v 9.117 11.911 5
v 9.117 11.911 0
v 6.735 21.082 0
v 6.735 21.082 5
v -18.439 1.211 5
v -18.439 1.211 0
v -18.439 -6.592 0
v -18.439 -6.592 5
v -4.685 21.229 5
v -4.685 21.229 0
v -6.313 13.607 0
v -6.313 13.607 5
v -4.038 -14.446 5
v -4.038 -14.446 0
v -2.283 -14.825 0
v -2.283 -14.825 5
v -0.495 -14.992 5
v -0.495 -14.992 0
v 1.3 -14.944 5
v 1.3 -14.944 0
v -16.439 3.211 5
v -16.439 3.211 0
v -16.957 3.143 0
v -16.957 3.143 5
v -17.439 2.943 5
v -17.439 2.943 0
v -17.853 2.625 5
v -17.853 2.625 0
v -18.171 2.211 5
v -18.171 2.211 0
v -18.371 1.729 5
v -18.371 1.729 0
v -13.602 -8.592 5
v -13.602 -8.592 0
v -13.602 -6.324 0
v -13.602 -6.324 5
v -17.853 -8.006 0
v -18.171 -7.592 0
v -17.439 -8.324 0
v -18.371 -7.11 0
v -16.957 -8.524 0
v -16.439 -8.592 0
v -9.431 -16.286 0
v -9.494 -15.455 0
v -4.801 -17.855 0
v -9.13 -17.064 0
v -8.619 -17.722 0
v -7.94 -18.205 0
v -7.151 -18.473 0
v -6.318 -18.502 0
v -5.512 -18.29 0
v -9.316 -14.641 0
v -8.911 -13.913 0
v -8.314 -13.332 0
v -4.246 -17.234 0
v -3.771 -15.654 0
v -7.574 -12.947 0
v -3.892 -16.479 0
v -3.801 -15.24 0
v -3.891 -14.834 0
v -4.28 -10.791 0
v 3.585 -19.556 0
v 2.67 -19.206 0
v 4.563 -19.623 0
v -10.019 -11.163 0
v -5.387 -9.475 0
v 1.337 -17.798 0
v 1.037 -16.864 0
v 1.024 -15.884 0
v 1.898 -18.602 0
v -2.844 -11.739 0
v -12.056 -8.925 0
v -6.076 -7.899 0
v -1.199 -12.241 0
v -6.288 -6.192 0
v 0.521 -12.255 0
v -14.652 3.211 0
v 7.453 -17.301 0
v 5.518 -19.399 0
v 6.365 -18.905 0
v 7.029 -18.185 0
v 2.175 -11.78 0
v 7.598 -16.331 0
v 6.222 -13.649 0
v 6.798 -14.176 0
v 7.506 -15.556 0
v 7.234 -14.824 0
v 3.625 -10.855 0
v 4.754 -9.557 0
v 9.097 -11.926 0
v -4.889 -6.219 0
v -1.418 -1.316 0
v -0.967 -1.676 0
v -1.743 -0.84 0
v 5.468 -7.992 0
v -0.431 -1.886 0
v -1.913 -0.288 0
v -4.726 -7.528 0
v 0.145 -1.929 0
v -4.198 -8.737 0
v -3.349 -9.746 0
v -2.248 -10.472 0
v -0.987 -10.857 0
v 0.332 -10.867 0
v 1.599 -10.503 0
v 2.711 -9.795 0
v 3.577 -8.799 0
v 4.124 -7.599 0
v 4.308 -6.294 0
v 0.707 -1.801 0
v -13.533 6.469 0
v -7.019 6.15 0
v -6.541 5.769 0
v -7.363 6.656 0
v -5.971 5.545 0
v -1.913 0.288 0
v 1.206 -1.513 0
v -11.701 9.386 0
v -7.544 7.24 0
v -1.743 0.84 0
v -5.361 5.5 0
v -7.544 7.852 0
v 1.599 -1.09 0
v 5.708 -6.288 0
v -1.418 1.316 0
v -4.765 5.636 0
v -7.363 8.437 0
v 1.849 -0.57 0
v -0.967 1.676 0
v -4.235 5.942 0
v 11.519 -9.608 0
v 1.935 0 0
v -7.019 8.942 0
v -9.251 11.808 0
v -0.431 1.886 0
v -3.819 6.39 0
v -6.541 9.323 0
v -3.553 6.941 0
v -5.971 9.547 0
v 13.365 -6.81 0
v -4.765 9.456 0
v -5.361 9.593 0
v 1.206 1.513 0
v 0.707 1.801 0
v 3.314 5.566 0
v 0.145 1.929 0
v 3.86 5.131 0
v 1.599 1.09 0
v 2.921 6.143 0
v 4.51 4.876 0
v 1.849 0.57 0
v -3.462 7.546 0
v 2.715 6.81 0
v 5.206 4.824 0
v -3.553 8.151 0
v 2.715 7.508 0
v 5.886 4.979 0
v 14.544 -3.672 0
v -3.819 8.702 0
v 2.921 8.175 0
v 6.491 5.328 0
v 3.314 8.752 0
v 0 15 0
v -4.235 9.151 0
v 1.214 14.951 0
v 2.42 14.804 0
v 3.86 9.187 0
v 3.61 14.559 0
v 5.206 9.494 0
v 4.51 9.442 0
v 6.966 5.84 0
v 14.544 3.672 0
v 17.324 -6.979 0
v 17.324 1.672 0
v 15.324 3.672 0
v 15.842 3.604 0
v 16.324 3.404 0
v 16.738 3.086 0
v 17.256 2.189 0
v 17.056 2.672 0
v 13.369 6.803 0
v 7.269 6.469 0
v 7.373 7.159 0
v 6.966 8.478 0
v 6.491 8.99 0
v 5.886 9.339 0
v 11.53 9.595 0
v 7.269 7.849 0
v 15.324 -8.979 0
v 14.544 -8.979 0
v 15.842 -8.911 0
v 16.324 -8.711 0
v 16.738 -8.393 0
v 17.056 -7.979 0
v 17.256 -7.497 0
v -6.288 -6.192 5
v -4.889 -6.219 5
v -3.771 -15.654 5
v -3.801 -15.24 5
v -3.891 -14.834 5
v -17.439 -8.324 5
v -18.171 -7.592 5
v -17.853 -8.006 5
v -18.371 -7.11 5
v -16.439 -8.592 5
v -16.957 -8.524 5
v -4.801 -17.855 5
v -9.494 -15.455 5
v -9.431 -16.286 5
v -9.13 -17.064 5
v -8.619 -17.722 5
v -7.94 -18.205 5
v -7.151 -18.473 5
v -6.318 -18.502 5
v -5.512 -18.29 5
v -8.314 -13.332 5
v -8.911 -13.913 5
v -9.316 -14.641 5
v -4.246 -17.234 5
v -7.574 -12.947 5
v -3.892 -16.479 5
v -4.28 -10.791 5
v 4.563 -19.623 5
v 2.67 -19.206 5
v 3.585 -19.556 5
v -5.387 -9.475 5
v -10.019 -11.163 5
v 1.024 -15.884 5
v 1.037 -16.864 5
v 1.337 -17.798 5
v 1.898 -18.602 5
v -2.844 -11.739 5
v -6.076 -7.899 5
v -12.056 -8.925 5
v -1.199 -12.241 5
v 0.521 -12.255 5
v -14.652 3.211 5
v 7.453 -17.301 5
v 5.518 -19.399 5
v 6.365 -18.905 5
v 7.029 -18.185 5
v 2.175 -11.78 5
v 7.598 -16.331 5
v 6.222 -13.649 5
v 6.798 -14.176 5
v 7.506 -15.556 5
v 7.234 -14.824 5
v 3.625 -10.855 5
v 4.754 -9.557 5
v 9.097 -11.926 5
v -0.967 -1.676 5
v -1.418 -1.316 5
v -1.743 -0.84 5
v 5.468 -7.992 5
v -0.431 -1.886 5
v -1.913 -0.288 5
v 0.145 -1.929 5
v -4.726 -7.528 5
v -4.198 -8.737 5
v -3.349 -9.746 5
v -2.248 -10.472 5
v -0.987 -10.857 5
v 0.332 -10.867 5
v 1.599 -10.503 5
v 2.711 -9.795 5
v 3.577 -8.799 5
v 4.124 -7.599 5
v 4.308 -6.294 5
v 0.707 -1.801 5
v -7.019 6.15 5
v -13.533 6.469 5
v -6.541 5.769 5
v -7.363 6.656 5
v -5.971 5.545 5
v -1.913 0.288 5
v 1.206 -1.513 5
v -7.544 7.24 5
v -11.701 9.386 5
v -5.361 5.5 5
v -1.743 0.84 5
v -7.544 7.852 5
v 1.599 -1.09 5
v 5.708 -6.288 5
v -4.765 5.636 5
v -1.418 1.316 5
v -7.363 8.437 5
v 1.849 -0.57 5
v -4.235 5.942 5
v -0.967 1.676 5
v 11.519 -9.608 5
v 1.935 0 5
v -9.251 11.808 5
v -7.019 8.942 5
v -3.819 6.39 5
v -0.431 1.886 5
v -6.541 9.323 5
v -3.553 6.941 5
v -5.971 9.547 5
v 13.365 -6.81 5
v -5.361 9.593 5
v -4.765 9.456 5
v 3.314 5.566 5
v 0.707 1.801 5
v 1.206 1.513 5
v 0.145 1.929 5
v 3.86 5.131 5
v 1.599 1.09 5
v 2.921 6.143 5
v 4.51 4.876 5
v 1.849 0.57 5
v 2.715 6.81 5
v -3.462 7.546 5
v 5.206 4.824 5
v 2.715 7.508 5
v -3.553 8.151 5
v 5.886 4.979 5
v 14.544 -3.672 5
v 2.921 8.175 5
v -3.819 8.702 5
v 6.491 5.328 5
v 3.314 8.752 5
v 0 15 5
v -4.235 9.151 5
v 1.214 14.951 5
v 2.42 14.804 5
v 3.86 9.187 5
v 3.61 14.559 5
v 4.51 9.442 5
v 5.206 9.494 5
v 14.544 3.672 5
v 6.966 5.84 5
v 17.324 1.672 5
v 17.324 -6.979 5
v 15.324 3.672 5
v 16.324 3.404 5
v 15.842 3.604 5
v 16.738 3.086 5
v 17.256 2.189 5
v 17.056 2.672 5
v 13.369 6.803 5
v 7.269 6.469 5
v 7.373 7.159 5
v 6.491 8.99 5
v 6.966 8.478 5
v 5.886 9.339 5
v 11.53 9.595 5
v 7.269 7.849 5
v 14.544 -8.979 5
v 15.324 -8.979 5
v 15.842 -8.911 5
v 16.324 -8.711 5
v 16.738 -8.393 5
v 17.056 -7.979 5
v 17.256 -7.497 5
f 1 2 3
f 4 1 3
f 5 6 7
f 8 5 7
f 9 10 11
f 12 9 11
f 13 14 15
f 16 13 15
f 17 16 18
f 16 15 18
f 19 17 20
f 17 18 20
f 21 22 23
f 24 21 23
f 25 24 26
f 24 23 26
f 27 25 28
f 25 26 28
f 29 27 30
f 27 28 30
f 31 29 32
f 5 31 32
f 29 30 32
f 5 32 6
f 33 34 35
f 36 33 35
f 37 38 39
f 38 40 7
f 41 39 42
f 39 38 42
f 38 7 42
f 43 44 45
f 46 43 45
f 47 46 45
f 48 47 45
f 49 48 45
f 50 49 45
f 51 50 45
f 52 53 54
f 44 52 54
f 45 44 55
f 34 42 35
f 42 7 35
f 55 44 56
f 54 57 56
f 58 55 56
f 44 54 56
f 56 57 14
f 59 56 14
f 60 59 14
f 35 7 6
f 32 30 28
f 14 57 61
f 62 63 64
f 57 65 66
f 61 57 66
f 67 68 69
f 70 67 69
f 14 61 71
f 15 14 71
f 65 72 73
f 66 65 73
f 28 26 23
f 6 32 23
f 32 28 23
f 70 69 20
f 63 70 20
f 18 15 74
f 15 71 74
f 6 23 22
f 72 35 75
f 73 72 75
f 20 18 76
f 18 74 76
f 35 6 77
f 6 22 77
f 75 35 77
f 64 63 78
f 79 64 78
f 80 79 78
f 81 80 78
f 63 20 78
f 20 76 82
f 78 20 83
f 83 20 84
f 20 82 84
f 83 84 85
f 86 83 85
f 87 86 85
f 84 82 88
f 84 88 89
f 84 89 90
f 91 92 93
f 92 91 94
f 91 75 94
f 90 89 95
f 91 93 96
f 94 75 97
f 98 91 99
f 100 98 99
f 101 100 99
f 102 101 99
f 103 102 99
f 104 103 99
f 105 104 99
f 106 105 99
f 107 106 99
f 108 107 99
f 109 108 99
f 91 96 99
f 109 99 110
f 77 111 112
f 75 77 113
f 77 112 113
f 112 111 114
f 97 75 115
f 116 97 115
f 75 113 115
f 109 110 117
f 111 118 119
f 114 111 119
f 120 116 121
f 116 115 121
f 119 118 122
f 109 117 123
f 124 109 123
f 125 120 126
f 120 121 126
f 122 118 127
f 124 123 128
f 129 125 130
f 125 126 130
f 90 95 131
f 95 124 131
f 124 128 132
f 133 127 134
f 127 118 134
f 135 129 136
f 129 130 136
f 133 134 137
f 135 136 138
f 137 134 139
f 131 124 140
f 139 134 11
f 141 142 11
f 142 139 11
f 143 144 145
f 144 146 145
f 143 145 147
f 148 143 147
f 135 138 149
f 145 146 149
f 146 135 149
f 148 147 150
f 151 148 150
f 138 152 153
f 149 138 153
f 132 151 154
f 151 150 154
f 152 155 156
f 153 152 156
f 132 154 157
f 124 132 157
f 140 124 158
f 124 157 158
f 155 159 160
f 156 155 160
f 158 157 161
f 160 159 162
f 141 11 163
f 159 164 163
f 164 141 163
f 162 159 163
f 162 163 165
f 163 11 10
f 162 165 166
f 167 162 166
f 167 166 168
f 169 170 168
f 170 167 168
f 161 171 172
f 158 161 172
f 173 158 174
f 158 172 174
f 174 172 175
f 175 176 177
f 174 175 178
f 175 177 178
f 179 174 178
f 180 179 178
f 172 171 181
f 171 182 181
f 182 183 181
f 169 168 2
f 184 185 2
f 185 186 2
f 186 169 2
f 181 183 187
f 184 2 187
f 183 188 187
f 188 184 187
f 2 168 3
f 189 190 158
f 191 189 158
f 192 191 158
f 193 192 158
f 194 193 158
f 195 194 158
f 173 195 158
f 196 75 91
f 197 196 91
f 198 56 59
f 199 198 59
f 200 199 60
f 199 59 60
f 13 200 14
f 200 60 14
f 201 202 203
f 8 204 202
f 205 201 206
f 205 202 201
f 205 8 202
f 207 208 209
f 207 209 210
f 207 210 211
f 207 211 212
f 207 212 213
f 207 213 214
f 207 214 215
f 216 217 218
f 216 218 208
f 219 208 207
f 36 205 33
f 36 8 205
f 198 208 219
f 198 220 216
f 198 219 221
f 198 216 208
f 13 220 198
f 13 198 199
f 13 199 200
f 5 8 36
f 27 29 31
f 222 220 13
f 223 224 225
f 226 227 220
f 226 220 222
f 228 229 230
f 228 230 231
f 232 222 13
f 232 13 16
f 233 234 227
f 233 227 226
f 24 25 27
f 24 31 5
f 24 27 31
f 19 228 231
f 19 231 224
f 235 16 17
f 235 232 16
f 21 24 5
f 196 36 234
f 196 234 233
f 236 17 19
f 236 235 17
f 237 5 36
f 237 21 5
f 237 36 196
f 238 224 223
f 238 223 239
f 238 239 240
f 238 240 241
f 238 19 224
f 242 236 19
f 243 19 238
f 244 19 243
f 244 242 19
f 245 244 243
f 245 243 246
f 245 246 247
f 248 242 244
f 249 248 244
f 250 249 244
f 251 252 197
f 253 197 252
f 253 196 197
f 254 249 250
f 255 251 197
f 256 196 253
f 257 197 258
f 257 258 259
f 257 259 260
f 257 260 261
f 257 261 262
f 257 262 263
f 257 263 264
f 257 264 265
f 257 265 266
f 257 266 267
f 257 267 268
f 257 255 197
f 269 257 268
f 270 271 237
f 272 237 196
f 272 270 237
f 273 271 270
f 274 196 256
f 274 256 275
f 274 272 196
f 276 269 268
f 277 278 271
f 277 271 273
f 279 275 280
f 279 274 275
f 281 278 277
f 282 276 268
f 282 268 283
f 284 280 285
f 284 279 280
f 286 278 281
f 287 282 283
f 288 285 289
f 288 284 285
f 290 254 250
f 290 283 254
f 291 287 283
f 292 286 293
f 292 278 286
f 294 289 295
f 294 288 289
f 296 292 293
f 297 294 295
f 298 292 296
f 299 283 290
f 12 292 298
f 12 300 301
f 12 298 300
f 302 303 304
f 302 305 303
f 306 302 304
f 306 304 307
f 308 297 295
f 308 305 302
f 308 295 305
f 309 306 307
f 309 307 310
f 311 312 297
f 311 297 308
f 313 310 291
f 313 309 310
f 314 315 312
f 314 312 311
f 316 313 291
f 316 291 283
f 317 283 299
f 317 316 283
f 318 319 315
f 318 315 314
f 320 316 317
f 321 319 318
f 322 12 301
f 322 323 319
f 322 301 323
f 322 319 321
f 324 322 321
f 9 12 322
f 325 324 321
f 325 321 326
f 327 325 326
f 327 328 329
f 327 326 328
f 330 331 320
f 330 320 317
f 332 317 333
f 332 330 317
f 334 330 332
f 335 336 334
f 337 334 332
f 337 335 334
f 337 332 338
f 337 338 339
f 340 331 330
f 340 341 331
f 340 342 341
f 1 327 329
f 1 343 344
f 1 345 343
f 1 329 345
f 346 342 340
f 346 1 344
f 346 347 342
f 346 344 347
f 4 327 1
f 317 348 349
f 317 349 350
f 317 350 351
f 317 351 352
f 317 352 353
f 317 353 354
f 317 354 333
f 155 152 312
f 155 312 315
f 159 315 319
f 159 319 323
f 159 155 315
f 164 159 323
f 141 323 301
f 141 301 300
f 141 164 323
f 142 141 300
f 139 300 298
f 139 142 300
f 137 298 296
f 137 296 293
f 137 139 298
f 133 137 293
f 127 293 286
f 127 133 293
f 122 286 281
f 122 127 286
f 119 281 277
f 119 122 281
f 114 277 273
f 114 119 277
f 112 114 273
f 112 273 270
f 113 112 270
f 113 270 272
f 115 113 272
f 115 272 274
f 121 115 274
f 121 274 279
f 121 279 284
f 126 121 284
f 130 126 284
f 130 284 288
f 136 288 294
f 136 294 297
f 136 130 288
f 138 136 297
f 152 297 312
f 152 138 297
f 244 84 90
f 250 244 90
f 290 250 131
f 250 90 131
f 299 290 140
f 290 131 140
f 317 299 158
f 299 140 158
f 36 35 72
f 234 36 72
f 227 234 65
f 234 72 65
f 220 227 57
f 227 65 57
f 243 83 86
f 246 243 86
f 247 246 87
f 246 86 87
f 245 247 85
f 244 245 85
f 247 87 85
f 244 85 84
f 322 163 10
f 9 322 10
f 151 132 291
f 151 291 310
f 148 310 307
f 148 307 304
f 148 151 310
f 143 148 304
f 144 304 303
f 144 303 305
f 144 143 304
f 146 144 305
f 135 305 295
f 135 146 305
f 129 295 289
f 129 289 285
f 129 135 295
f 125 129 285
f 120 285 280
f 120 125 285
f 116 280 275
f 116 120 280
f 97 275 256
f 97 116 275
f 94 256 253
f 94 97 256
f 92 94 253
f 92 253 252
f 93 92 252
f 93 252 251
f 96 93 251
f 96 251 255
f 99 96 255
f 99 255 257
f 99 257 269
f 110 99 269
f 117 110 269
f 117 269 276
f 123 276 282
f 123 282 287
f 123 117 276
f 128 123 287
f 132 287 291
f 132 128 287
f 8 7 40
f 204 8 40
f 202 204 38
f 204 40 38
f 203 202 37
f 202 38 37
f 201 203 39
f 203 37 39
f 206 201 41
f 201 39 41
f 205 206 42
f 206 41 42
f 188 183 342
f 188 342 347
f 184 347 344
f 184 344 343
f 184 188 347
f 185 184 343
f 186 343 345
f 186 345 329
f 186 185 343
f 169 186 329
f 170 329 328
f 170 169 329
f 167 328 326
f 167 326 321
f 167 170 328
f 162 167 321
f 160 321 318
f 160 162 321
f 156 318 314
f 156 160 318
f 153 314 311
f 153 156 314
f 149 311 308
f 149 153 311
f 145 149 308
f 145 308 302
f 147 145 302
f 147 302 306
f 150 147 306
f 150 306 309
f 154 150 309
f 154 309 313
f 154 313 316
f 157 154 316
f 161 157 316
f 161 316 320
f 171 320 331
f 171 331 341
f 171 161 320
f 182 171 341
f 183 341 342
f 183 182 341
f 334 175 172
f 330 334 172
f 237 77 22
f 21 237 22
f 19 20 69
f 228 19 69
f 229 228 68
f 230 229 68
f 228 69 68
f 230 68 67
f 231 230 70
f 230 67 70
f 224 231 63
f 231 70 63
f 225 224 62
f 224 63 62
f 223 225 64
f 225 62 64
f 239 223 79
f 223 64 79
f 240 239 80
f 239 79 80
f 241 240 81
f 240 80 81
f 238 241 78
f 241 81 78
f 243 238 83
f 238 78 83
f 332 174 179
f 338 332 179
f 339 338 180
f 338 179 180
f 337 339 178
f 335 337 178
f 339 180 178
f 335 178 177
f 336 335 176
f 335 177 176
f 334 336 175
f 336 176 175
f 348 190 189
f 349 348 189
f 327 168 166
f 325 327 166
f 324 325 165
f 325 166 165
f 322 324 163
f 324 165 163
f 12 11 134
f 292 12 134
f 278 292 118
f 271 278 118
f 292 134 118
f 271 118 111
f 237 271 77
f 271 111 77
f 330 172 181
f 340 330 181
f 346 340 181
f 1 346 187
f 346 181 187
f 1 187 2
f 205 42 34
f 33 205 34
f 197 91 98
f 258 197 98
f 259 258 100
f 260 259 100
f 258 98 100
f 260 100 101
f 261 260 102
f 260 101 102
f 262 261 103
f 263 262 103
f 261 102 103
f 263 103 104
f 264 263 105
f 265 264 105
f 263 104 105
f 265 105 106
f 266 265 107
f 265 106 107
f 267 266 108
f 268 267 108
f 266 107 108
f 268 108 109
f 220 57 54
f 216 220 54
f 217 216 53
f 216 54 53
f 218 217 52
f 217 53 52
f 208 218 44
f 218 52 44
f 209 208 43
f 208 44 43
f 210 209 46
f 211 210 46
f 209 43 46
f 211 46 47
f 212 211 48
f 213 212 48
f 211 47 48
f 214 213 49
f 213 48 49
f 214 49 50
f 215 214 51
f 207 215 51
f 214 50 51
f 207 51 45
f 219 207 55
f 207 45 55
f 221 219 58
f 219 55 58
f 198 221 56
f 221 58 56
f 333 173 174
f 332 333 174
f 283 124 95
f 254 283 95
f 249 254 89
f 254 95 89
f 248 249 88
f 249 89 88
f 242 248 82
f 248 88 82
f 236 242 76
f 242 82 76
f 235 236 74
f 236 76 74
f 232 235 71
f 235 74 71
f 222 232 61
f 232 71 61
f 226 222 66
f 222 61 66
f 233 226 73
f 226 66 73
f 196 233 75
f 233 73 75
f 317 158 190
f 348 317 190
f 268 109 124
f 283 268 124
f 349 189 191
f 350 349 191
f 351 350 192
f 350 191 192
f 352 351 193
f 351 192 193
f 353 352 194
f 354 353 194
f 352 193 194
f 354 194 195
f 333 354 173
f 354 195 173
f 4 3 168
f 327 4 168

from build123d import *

# Parameters (mm, degrees)
F0_R     = 1.9348900532
F0_R_2   = 2.0522604458
F0_R_3   = 2.3419360145
F1_DEPTH = 5


with BuildPart() as f1:
    # F0 (on Top) → F1 (new body)
    with BuildSketch(Plane.XY):
        with BuildLine():
            Line((14.5436545132, -3.6717997494), (14.5436545132, 3.6717997494))
            ThreePointArc((14.5436545132, 3.6717997494), (12.5272279605, 8.2503672419), (9.117258298, 11.9111544834))
            ThreePointArc((9.117258298, 11.9111544834), (6.4998434958, 13.5185810842), (3.6098778188, 14.5591477132))
            ThreePointArc((3.6098778188, 14.5591477132), (1.818348743, 14.8893790283), (0, 15))
            ThreePointArc((0, 15), (-3.2325615836, 14.6475440129), (-6.3132117426, 13.6067394145))
            ThreePointArc((-6.3132117426, 13.6067394145), (-11.7007085883, 9.3858094234), (-14.6523065602, 3.2109052408))
            Line((-14.6523065602, 3.2109052408), (-13.6017017066, 3.2109052408))
            Line((-13.6017017066, 3.2109052408), (-13.6017017066, -6.3240580867))
            ThreePointArc((-13.6017017066, -6.3240580867), (-11.0937814491, -10.0959404297), (-7.5742680527, -12.9472183679))
            ThreePointArc((-7.5742680527, -12.9472183679), (-5.5179001004, -13.0164836252), (-4.0382475823, -14.4461952245))
            ThreePointArc((-4.0382475823, -14.4461952245), (-1.3916396268, -14.9353051241), (1.2997714686, -14.9435803651))
            ThreePointArc((1.2997714686, -14.9435803651), (3.4559828028, -13.1380275344), (6.2215345161, -13.6489013574))
            ThreePointArc((6.2215345161, -13.6489013574), (11.5188501154, -9.6081263532), (14.5436545132, -3.6717997494))
        make_face()
        with BuildLine():
            ThreePointArc((5.7079247199, -6.2883910723), (-0.3391810804, -12.3095638451), (-6.2883906066, -6.1916462146))
            Line((-6.2883906066, -6.1916462146), (-4.8886678044, -6.2194979452))
            ThreePointArc((-4.8886678044, -6.2194979452), (-0.3278910818, -10.9096094966), (4.3079347792, -6.2936643859))
            Line((4.3079347792, -6.2936643859), (5.7079247199, -6.2883910723))
        make_face(mode=Mode.SUBTRACT)
        Circle(F0_R, mode=Mode.SUBTRACT)
        with Locations((-5.5144345388, 7.5460691005)):
            Circle(F0_R_2, mode=Mode.SUBTRACT)
        with Locations((5.0307135098, 7.1590915322)):
            Circle(F0_R_3, mode=Mode.SUBTRACT)
        with BuildLine():
            ThreePointArc((1.2997714686, -14.9435803651), (3.8159611322, -14.5064964977), (6.2215345161, -13.6489013574))
            ThreePointArc((6.2215345161, -13.6489013574), (3.4559828028, -13.1380275344), (1.2997714686, -14.9435803651))
        make_face()
        with BuildLine():
            ThreePointArc((7.5981171759, -16.3314789534), (7.2338832803, -14.8238979126), (6.2215345161, -13.6489013574))
            ThreePointArc((6.2215345161, -13.6489013574), (3.8159611322, -14.5064964977), (1.2997714686, -14.9435803651))
            ThreePointArc((1.2997714686, -14.9435803651), (3.5854281507, -19.5562045673), (7.5981171759, -16.3314789534))
        make_face()
        with BuildLine():
            ThreePointArc((-3.7710910204, -15.6542677432), (-3.8386773507, -15.0356378379), (-4.0382475823, -14.4461952245))
            ThreePointArc((-4.0382475823, -14.4461952245), (-5.8544310354, -13.8103452981), (-7.5742680527, -12.9472183679))
            ThreePointArc((-7.5742680527, -12.9472183679), (-8.297487219, -17.9883774161), (-3.7710910204, -15.6542677432))
        make_face()
        with BuildLine():
            ThreePointArc((-7.5742680527, -12.9472183679), (-5.8544310354, -13.8103452981), (-4.0382475823, -14.4461952245))
            ThreePointArc((-4.0382475823, -14.4461952245), (-5.5179001004, -13.0164836252), (-7.5742680527, -12.9472183679))
        make_face()
        with BuildLine():
            ThreePointArc((14.5436545132, 3.6717997494), (14.8854764401, 1.8500246352), (15, 0))
            ThreePointArc((15, 0), (14.8854764401, -1.8500246352), (14.5436545132, -3.6717997494))
            Line((14.5436545132, -3.6717997494), (14.5436545132, -8.978898637))
            Line((14.5436545132, -8.978898637), (15.3239746839, -8.978898637))
            ThreePointArc((15.3239746839, -8.978898637), (16.7381882463, -8.3931121994), (17.3239746839, -6.978898637))
            Line((17.3239746839, -6.978898637), (17.3239746839, 1.6717997494))
            ThreePointArc((17.3239746839, 1.6717997494), (16.7381882463, 3.0860133118), (15.3239746839, 3.6717997494))
            Line((15.3239746839, 3.6717997494), (14.5436545132, 3.6717997494))
        make_face()
        with BuildLine():
            ThreePointArc((14.5436545132, -3.6717997494), (14.8854764401, -1.8500246352), (15, 0))
            ThreePointArc((15, 0), (14.8854764401, 1.8500246352), (14.5436545132, 3.6717997494))
            Line((14.5436545132, 3.6717997494), (14.5436545132, -3.6717997494))
        make_face()
        with BuildLine():
            ThreePointArc((-13.6017017066, -6.3240580867), (-14.9097661685, -1.6428246406), (-14.6523065602, 3.2109052408))
            Line((-14.6523065602, 3.2109052408), (-16.4389259666, 3.2109052408))
            ThreePointArc((-16.4389259666, 3.2109052408), (-17.853139529, 2.6251188032), (-18.4389259666, 1.2109052408))
            Line((-18.4389259666, 1.2109052408), (-18.4389259666, -6.5919210687))
            ThreePointArc((-18.4389259666, -6.5919210687), (-17.853139529, -8.0061346311), (-16.4389259666, -8.5919210687))
            Line((-16.4389259666, -8.5919210687), (-13.6017017066, -8.5919210687))
            Line((-13.6017017066, -8.5919210687), (-13.6017017066, -6.3240580867))
        make_face()
        with BuildLine():
            Line((-13.6017017066, 3.2109052408), (-14.6523065602, 3.2109052408))
            ThreePointArc((-14.6523065602, 3.2109052408), (-14.9097661685, -1.6428246406), (-13.6017017066, -6.3240580867))
            Line((-13.6017017066, -6.3240580867), (-13.6017017066, 3.2109052408))
        make_face()
        with BuildLine():
            ThreePointArc((-6.3132117426, 13.6067394145), (-3.2325615836, 14.6475440129), (0, 15))
            Line((0, 15), (-4.6849409118, 21.2286375463))
            Line((-4.6849409118, 21.2286375463), (-6.3132117426, 13.6067394145))
        make_face()
        with BuildLine():
            ThreePointArc((3.6098778188, 14.5591477132), (6.4998434958, 13.5185810842), (9.117258298, 11.9111544834))
            Line((9.117258298, 11.9111544834), (6.734602619, 21.0822317749))
            Line((6.734602619, 21.0822317749), (3.6098778188, 14.5591477132))
        make_face()
    extrude(amount=F1_DEPTH)


solid = f1.part
